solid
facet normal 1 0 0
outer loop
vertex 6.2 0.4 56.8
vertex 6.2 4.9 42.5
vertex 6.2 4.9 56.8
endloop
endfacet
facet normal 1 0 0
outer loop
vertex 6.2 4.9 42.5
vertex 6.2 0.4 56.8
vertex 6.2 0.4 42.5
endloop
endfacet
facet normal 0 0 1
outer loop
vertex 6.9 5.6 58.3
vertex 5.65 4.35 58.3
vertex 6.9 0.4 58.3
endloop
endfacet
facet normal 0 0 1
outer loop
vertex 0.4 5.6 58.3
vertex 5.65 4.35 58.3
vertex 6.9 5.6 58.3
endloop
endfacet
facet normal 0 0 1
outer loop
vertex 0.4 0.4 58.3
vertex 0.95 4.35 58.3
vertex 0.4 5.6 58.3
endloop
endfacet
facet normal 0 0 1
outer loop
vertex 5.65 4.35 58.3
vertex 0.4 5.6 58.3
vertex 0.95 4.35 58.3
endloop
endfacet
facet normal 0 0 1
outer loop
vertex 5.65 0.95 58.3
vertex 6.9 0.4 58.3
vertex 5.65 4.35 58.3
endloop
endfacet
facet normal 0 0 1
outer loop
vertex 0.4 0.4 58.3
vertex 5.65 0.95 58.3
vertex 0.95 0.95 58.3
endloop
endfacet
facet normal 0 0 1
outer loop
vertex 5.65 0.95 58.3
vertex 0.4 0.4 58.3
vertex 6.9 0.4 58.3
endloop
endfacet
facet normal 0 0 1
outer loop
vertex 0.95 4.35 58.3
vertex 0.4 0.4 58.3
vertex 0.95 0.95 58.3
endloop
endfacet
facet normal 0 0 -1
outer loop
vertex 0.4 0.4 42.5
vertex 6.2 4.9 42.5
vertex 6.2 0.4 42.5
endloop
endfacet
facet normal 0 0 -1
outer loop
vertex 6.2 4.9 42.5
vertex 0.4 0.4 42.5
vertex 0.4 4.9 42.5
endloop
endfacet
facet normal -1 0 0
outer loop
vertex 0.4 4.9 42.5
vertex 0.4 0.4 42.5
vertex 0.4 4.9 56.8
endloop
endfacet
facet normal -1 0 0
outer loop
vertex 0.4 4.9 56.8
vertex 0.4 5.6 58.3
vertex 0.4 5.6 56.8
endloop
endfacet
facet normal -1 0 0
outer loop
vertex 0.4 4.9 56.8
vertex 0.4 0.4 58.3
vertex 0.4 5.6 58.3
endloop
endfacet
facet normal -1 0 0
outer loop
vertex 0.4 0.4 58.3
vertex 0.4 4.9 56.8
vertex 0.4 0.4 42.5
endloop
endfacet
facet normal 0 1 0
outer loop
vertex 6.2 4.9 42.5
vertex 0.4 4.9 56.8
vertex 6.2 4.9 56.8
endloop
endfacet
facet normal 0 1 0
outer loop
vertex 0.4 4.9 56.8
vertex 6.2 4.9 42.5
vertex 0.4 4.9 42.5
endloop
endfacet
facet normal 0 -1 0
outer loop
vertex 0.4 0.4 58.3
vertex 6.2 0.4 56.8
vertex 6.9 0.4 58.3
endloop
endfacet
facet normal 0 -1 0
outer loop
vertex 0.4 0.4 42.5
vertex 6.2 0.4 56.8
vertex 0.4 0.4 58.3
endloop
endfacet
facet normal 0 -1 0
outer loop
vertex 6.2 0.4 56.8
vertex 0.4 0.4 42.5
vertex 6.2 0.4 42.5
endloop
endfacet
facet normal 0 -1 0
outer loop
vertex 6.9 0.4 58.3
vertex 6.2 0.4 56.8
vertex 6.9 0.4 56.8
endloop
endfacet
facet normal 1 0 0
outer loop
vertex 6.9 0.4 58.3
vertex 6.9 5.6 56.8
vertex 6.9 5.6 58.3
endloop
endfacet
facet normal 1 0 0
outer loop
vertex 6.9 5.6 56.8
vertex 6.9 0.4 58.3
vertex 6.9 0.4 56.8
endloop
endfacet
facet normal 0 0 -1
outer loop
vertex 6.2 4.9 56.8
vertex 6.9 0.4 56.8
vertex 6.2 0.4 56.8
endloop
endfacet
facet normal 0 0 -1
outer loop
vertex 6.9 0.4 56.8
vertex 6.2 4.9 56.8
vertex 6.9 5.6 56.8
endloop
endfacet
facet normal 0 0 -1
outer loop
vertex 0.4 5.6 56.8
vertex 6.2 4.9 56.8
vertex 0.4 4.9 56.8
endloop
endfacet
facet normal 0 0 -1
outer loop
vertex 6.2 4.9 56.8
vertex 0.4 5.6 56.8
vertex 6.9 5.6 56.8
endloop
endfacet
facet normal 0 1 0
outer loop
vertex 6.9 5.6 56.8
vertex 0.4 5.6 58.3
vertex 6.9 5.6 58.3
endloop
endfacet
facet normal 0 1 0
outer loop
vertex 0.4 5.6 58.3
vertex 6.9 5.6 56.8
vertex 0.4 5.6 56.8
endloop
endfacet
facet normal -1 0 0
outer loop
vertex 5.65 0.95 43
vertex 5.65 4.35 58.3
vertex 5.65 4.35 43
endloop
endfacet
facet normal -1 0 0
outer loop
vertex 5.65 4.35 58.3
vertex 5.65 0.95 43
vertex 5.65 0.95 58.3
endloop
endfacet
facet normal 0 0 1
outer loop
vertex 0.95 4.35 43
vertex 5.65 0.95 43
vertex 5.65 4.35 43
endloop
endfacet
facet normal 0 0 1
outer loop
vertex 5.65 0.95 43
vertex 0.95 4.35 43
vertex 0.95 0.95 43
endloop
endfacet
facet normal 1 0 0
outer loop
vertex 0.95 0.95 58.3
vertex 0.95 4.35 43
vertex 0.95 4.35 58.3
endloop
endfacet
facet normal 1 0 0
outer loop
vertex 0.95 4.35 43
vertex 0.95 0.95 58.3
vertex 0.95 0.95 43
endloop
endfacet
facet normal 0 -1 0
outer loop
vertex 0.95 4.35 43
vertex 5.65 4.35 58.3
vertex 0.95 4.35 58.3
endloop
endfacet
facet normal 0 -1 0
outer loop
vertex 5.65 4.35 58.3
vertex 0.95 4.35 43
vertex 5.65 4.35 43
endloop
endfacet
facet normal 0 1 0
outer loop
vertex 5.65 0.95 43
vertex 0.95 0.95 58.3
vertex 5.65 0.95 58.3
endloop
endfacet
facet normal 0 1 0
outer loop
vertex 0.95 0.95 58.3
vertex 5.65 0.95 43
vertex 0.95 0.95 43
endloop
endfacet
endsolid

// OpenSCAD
// AeroSense , mm. Original PCB datum retained. Nonbiological fit prototype.
// Canonical fallback CAD builder: OpenSCAD 2021.01 CGAL.
// Select part="cap", "body", "gas", "gas_open" or "plate"; print_pose=true only for body/cap.
part="well";
print_pose=false;
$fn=64;
hole_d=1.6; nx=4; ny=3; inlet_gap=1.5;
zin=64.2+inlet_gap; zroof=zin+3.3;
zliq=43+150/(4.7*3.4);
module box(w,d,h,x=0,y=0,z=0){translate([x-w/2,y-d/2,z])cube([w,d,h]);}
module cyl(r,h,x=0,y=0,z=0){translate([x,y,z])cylinder(h=h,r=r);}
module hcyl(r,h,x,y,z){translate([x,y,z])rotate([0,90,0])cylinder(h=h,r=r);}
module roundbox(w,d,h,r=4,z=0){
 union(){box(w-2*r,d,h,z=z);box(w,d-2*r,h,z=z);
 for(i=[-1,1])for(j=[-1,1])cyl(r,h,i*(w/2-r),j*(d/2-r),z);}
}
module plate(){difference(){box(14,11,1.2,z=63);
 for(i=[0:nx-1])for(j=[0:ny-1])cyl(hole_d/2,1.6,-4.8+i*9.6/(nx-1),-3.4+j*6.8/(ny-1),62.8);}}
module gas_open(){union(){box(14,11,zroof-61.8,z=60);
 for(sx=[-1,1])for(sy=[-1,1])box(4.7,3.4,60-zliq,sx*3.3,sy*2.65,zliq);
 hcyl(1.2,16.1,-23,0,zin);hcyl(1.2,16.1,6.9,0,61.5);}}
module gas(){difference(){gas_open();plate();}}
module cap(){difference(){
 union(){roundbox(32,26,zroof-58.9,2,58.9);
 difference(){roundbox(38,32,zroof-56.8,2,56.8);roundbox(34,28,zroof-55,1,56);}
 for(y=[-19,19]){cyl(4,4,0,y,58.9);box(8,8,4,0,sign(y)*15.5,58.9);}
 hcyl(1.7,8,-23,0,zin);hcyl(2,1,-21.5,0,zin);
 hcyl(1.7,8,15,0,61.5);hcyl(2,1,20.5,0,61.5);}
 gas();
 for(y=[-19,19]){cyl(1.7,7,0,y,58);cyl(4.3,2.9,0,y,56);}
}}
module body(){difference(){union(){import("inputs/body_input.stl",convexity=20);
 // Fill the old through-bores only inside the existing 3 mm side walls.
 for(s=[-1,1])box(3,6.4,6.4,s*55.5,0,58.8);}
 hcyl(3.1,10,-62,0,zin);hcyl(3.1,10,52,0,61.5);
}}
if(part=="cap")translate(print_pose?[23,23,-56.8]:[0,0,0])cap();
if(part=="body")translate(print_pose?[57,52,-3]:[0,0,0])body();
if(part=="gas")gas();
if(part=="gas_open")gas_open();
if(part=="plate")plate();

// Flat culture-contact floor. Uniform 0.5 mm bottom; PCB keepouts are retained below the well.
sx=1; sy=1;
module well_ne(){difference(){union(){
 box(5.8,4.5,15.8,3.3,2.65,42.5);
 box(6.5,5.2,1.5,3.65,3,56.8);}
 box(4.7,3.4,16,3.3,2.65,43);
}}
module well(){scale([sx,sy,1])well_ne();}
if(part=="well")well();
if(part=="well_section")intersection(){well();box(20,20,30,4,10+2.65,35);}
if(part=="cap_section")intersection(){cap();box(60,30,30,0,15,50);}
